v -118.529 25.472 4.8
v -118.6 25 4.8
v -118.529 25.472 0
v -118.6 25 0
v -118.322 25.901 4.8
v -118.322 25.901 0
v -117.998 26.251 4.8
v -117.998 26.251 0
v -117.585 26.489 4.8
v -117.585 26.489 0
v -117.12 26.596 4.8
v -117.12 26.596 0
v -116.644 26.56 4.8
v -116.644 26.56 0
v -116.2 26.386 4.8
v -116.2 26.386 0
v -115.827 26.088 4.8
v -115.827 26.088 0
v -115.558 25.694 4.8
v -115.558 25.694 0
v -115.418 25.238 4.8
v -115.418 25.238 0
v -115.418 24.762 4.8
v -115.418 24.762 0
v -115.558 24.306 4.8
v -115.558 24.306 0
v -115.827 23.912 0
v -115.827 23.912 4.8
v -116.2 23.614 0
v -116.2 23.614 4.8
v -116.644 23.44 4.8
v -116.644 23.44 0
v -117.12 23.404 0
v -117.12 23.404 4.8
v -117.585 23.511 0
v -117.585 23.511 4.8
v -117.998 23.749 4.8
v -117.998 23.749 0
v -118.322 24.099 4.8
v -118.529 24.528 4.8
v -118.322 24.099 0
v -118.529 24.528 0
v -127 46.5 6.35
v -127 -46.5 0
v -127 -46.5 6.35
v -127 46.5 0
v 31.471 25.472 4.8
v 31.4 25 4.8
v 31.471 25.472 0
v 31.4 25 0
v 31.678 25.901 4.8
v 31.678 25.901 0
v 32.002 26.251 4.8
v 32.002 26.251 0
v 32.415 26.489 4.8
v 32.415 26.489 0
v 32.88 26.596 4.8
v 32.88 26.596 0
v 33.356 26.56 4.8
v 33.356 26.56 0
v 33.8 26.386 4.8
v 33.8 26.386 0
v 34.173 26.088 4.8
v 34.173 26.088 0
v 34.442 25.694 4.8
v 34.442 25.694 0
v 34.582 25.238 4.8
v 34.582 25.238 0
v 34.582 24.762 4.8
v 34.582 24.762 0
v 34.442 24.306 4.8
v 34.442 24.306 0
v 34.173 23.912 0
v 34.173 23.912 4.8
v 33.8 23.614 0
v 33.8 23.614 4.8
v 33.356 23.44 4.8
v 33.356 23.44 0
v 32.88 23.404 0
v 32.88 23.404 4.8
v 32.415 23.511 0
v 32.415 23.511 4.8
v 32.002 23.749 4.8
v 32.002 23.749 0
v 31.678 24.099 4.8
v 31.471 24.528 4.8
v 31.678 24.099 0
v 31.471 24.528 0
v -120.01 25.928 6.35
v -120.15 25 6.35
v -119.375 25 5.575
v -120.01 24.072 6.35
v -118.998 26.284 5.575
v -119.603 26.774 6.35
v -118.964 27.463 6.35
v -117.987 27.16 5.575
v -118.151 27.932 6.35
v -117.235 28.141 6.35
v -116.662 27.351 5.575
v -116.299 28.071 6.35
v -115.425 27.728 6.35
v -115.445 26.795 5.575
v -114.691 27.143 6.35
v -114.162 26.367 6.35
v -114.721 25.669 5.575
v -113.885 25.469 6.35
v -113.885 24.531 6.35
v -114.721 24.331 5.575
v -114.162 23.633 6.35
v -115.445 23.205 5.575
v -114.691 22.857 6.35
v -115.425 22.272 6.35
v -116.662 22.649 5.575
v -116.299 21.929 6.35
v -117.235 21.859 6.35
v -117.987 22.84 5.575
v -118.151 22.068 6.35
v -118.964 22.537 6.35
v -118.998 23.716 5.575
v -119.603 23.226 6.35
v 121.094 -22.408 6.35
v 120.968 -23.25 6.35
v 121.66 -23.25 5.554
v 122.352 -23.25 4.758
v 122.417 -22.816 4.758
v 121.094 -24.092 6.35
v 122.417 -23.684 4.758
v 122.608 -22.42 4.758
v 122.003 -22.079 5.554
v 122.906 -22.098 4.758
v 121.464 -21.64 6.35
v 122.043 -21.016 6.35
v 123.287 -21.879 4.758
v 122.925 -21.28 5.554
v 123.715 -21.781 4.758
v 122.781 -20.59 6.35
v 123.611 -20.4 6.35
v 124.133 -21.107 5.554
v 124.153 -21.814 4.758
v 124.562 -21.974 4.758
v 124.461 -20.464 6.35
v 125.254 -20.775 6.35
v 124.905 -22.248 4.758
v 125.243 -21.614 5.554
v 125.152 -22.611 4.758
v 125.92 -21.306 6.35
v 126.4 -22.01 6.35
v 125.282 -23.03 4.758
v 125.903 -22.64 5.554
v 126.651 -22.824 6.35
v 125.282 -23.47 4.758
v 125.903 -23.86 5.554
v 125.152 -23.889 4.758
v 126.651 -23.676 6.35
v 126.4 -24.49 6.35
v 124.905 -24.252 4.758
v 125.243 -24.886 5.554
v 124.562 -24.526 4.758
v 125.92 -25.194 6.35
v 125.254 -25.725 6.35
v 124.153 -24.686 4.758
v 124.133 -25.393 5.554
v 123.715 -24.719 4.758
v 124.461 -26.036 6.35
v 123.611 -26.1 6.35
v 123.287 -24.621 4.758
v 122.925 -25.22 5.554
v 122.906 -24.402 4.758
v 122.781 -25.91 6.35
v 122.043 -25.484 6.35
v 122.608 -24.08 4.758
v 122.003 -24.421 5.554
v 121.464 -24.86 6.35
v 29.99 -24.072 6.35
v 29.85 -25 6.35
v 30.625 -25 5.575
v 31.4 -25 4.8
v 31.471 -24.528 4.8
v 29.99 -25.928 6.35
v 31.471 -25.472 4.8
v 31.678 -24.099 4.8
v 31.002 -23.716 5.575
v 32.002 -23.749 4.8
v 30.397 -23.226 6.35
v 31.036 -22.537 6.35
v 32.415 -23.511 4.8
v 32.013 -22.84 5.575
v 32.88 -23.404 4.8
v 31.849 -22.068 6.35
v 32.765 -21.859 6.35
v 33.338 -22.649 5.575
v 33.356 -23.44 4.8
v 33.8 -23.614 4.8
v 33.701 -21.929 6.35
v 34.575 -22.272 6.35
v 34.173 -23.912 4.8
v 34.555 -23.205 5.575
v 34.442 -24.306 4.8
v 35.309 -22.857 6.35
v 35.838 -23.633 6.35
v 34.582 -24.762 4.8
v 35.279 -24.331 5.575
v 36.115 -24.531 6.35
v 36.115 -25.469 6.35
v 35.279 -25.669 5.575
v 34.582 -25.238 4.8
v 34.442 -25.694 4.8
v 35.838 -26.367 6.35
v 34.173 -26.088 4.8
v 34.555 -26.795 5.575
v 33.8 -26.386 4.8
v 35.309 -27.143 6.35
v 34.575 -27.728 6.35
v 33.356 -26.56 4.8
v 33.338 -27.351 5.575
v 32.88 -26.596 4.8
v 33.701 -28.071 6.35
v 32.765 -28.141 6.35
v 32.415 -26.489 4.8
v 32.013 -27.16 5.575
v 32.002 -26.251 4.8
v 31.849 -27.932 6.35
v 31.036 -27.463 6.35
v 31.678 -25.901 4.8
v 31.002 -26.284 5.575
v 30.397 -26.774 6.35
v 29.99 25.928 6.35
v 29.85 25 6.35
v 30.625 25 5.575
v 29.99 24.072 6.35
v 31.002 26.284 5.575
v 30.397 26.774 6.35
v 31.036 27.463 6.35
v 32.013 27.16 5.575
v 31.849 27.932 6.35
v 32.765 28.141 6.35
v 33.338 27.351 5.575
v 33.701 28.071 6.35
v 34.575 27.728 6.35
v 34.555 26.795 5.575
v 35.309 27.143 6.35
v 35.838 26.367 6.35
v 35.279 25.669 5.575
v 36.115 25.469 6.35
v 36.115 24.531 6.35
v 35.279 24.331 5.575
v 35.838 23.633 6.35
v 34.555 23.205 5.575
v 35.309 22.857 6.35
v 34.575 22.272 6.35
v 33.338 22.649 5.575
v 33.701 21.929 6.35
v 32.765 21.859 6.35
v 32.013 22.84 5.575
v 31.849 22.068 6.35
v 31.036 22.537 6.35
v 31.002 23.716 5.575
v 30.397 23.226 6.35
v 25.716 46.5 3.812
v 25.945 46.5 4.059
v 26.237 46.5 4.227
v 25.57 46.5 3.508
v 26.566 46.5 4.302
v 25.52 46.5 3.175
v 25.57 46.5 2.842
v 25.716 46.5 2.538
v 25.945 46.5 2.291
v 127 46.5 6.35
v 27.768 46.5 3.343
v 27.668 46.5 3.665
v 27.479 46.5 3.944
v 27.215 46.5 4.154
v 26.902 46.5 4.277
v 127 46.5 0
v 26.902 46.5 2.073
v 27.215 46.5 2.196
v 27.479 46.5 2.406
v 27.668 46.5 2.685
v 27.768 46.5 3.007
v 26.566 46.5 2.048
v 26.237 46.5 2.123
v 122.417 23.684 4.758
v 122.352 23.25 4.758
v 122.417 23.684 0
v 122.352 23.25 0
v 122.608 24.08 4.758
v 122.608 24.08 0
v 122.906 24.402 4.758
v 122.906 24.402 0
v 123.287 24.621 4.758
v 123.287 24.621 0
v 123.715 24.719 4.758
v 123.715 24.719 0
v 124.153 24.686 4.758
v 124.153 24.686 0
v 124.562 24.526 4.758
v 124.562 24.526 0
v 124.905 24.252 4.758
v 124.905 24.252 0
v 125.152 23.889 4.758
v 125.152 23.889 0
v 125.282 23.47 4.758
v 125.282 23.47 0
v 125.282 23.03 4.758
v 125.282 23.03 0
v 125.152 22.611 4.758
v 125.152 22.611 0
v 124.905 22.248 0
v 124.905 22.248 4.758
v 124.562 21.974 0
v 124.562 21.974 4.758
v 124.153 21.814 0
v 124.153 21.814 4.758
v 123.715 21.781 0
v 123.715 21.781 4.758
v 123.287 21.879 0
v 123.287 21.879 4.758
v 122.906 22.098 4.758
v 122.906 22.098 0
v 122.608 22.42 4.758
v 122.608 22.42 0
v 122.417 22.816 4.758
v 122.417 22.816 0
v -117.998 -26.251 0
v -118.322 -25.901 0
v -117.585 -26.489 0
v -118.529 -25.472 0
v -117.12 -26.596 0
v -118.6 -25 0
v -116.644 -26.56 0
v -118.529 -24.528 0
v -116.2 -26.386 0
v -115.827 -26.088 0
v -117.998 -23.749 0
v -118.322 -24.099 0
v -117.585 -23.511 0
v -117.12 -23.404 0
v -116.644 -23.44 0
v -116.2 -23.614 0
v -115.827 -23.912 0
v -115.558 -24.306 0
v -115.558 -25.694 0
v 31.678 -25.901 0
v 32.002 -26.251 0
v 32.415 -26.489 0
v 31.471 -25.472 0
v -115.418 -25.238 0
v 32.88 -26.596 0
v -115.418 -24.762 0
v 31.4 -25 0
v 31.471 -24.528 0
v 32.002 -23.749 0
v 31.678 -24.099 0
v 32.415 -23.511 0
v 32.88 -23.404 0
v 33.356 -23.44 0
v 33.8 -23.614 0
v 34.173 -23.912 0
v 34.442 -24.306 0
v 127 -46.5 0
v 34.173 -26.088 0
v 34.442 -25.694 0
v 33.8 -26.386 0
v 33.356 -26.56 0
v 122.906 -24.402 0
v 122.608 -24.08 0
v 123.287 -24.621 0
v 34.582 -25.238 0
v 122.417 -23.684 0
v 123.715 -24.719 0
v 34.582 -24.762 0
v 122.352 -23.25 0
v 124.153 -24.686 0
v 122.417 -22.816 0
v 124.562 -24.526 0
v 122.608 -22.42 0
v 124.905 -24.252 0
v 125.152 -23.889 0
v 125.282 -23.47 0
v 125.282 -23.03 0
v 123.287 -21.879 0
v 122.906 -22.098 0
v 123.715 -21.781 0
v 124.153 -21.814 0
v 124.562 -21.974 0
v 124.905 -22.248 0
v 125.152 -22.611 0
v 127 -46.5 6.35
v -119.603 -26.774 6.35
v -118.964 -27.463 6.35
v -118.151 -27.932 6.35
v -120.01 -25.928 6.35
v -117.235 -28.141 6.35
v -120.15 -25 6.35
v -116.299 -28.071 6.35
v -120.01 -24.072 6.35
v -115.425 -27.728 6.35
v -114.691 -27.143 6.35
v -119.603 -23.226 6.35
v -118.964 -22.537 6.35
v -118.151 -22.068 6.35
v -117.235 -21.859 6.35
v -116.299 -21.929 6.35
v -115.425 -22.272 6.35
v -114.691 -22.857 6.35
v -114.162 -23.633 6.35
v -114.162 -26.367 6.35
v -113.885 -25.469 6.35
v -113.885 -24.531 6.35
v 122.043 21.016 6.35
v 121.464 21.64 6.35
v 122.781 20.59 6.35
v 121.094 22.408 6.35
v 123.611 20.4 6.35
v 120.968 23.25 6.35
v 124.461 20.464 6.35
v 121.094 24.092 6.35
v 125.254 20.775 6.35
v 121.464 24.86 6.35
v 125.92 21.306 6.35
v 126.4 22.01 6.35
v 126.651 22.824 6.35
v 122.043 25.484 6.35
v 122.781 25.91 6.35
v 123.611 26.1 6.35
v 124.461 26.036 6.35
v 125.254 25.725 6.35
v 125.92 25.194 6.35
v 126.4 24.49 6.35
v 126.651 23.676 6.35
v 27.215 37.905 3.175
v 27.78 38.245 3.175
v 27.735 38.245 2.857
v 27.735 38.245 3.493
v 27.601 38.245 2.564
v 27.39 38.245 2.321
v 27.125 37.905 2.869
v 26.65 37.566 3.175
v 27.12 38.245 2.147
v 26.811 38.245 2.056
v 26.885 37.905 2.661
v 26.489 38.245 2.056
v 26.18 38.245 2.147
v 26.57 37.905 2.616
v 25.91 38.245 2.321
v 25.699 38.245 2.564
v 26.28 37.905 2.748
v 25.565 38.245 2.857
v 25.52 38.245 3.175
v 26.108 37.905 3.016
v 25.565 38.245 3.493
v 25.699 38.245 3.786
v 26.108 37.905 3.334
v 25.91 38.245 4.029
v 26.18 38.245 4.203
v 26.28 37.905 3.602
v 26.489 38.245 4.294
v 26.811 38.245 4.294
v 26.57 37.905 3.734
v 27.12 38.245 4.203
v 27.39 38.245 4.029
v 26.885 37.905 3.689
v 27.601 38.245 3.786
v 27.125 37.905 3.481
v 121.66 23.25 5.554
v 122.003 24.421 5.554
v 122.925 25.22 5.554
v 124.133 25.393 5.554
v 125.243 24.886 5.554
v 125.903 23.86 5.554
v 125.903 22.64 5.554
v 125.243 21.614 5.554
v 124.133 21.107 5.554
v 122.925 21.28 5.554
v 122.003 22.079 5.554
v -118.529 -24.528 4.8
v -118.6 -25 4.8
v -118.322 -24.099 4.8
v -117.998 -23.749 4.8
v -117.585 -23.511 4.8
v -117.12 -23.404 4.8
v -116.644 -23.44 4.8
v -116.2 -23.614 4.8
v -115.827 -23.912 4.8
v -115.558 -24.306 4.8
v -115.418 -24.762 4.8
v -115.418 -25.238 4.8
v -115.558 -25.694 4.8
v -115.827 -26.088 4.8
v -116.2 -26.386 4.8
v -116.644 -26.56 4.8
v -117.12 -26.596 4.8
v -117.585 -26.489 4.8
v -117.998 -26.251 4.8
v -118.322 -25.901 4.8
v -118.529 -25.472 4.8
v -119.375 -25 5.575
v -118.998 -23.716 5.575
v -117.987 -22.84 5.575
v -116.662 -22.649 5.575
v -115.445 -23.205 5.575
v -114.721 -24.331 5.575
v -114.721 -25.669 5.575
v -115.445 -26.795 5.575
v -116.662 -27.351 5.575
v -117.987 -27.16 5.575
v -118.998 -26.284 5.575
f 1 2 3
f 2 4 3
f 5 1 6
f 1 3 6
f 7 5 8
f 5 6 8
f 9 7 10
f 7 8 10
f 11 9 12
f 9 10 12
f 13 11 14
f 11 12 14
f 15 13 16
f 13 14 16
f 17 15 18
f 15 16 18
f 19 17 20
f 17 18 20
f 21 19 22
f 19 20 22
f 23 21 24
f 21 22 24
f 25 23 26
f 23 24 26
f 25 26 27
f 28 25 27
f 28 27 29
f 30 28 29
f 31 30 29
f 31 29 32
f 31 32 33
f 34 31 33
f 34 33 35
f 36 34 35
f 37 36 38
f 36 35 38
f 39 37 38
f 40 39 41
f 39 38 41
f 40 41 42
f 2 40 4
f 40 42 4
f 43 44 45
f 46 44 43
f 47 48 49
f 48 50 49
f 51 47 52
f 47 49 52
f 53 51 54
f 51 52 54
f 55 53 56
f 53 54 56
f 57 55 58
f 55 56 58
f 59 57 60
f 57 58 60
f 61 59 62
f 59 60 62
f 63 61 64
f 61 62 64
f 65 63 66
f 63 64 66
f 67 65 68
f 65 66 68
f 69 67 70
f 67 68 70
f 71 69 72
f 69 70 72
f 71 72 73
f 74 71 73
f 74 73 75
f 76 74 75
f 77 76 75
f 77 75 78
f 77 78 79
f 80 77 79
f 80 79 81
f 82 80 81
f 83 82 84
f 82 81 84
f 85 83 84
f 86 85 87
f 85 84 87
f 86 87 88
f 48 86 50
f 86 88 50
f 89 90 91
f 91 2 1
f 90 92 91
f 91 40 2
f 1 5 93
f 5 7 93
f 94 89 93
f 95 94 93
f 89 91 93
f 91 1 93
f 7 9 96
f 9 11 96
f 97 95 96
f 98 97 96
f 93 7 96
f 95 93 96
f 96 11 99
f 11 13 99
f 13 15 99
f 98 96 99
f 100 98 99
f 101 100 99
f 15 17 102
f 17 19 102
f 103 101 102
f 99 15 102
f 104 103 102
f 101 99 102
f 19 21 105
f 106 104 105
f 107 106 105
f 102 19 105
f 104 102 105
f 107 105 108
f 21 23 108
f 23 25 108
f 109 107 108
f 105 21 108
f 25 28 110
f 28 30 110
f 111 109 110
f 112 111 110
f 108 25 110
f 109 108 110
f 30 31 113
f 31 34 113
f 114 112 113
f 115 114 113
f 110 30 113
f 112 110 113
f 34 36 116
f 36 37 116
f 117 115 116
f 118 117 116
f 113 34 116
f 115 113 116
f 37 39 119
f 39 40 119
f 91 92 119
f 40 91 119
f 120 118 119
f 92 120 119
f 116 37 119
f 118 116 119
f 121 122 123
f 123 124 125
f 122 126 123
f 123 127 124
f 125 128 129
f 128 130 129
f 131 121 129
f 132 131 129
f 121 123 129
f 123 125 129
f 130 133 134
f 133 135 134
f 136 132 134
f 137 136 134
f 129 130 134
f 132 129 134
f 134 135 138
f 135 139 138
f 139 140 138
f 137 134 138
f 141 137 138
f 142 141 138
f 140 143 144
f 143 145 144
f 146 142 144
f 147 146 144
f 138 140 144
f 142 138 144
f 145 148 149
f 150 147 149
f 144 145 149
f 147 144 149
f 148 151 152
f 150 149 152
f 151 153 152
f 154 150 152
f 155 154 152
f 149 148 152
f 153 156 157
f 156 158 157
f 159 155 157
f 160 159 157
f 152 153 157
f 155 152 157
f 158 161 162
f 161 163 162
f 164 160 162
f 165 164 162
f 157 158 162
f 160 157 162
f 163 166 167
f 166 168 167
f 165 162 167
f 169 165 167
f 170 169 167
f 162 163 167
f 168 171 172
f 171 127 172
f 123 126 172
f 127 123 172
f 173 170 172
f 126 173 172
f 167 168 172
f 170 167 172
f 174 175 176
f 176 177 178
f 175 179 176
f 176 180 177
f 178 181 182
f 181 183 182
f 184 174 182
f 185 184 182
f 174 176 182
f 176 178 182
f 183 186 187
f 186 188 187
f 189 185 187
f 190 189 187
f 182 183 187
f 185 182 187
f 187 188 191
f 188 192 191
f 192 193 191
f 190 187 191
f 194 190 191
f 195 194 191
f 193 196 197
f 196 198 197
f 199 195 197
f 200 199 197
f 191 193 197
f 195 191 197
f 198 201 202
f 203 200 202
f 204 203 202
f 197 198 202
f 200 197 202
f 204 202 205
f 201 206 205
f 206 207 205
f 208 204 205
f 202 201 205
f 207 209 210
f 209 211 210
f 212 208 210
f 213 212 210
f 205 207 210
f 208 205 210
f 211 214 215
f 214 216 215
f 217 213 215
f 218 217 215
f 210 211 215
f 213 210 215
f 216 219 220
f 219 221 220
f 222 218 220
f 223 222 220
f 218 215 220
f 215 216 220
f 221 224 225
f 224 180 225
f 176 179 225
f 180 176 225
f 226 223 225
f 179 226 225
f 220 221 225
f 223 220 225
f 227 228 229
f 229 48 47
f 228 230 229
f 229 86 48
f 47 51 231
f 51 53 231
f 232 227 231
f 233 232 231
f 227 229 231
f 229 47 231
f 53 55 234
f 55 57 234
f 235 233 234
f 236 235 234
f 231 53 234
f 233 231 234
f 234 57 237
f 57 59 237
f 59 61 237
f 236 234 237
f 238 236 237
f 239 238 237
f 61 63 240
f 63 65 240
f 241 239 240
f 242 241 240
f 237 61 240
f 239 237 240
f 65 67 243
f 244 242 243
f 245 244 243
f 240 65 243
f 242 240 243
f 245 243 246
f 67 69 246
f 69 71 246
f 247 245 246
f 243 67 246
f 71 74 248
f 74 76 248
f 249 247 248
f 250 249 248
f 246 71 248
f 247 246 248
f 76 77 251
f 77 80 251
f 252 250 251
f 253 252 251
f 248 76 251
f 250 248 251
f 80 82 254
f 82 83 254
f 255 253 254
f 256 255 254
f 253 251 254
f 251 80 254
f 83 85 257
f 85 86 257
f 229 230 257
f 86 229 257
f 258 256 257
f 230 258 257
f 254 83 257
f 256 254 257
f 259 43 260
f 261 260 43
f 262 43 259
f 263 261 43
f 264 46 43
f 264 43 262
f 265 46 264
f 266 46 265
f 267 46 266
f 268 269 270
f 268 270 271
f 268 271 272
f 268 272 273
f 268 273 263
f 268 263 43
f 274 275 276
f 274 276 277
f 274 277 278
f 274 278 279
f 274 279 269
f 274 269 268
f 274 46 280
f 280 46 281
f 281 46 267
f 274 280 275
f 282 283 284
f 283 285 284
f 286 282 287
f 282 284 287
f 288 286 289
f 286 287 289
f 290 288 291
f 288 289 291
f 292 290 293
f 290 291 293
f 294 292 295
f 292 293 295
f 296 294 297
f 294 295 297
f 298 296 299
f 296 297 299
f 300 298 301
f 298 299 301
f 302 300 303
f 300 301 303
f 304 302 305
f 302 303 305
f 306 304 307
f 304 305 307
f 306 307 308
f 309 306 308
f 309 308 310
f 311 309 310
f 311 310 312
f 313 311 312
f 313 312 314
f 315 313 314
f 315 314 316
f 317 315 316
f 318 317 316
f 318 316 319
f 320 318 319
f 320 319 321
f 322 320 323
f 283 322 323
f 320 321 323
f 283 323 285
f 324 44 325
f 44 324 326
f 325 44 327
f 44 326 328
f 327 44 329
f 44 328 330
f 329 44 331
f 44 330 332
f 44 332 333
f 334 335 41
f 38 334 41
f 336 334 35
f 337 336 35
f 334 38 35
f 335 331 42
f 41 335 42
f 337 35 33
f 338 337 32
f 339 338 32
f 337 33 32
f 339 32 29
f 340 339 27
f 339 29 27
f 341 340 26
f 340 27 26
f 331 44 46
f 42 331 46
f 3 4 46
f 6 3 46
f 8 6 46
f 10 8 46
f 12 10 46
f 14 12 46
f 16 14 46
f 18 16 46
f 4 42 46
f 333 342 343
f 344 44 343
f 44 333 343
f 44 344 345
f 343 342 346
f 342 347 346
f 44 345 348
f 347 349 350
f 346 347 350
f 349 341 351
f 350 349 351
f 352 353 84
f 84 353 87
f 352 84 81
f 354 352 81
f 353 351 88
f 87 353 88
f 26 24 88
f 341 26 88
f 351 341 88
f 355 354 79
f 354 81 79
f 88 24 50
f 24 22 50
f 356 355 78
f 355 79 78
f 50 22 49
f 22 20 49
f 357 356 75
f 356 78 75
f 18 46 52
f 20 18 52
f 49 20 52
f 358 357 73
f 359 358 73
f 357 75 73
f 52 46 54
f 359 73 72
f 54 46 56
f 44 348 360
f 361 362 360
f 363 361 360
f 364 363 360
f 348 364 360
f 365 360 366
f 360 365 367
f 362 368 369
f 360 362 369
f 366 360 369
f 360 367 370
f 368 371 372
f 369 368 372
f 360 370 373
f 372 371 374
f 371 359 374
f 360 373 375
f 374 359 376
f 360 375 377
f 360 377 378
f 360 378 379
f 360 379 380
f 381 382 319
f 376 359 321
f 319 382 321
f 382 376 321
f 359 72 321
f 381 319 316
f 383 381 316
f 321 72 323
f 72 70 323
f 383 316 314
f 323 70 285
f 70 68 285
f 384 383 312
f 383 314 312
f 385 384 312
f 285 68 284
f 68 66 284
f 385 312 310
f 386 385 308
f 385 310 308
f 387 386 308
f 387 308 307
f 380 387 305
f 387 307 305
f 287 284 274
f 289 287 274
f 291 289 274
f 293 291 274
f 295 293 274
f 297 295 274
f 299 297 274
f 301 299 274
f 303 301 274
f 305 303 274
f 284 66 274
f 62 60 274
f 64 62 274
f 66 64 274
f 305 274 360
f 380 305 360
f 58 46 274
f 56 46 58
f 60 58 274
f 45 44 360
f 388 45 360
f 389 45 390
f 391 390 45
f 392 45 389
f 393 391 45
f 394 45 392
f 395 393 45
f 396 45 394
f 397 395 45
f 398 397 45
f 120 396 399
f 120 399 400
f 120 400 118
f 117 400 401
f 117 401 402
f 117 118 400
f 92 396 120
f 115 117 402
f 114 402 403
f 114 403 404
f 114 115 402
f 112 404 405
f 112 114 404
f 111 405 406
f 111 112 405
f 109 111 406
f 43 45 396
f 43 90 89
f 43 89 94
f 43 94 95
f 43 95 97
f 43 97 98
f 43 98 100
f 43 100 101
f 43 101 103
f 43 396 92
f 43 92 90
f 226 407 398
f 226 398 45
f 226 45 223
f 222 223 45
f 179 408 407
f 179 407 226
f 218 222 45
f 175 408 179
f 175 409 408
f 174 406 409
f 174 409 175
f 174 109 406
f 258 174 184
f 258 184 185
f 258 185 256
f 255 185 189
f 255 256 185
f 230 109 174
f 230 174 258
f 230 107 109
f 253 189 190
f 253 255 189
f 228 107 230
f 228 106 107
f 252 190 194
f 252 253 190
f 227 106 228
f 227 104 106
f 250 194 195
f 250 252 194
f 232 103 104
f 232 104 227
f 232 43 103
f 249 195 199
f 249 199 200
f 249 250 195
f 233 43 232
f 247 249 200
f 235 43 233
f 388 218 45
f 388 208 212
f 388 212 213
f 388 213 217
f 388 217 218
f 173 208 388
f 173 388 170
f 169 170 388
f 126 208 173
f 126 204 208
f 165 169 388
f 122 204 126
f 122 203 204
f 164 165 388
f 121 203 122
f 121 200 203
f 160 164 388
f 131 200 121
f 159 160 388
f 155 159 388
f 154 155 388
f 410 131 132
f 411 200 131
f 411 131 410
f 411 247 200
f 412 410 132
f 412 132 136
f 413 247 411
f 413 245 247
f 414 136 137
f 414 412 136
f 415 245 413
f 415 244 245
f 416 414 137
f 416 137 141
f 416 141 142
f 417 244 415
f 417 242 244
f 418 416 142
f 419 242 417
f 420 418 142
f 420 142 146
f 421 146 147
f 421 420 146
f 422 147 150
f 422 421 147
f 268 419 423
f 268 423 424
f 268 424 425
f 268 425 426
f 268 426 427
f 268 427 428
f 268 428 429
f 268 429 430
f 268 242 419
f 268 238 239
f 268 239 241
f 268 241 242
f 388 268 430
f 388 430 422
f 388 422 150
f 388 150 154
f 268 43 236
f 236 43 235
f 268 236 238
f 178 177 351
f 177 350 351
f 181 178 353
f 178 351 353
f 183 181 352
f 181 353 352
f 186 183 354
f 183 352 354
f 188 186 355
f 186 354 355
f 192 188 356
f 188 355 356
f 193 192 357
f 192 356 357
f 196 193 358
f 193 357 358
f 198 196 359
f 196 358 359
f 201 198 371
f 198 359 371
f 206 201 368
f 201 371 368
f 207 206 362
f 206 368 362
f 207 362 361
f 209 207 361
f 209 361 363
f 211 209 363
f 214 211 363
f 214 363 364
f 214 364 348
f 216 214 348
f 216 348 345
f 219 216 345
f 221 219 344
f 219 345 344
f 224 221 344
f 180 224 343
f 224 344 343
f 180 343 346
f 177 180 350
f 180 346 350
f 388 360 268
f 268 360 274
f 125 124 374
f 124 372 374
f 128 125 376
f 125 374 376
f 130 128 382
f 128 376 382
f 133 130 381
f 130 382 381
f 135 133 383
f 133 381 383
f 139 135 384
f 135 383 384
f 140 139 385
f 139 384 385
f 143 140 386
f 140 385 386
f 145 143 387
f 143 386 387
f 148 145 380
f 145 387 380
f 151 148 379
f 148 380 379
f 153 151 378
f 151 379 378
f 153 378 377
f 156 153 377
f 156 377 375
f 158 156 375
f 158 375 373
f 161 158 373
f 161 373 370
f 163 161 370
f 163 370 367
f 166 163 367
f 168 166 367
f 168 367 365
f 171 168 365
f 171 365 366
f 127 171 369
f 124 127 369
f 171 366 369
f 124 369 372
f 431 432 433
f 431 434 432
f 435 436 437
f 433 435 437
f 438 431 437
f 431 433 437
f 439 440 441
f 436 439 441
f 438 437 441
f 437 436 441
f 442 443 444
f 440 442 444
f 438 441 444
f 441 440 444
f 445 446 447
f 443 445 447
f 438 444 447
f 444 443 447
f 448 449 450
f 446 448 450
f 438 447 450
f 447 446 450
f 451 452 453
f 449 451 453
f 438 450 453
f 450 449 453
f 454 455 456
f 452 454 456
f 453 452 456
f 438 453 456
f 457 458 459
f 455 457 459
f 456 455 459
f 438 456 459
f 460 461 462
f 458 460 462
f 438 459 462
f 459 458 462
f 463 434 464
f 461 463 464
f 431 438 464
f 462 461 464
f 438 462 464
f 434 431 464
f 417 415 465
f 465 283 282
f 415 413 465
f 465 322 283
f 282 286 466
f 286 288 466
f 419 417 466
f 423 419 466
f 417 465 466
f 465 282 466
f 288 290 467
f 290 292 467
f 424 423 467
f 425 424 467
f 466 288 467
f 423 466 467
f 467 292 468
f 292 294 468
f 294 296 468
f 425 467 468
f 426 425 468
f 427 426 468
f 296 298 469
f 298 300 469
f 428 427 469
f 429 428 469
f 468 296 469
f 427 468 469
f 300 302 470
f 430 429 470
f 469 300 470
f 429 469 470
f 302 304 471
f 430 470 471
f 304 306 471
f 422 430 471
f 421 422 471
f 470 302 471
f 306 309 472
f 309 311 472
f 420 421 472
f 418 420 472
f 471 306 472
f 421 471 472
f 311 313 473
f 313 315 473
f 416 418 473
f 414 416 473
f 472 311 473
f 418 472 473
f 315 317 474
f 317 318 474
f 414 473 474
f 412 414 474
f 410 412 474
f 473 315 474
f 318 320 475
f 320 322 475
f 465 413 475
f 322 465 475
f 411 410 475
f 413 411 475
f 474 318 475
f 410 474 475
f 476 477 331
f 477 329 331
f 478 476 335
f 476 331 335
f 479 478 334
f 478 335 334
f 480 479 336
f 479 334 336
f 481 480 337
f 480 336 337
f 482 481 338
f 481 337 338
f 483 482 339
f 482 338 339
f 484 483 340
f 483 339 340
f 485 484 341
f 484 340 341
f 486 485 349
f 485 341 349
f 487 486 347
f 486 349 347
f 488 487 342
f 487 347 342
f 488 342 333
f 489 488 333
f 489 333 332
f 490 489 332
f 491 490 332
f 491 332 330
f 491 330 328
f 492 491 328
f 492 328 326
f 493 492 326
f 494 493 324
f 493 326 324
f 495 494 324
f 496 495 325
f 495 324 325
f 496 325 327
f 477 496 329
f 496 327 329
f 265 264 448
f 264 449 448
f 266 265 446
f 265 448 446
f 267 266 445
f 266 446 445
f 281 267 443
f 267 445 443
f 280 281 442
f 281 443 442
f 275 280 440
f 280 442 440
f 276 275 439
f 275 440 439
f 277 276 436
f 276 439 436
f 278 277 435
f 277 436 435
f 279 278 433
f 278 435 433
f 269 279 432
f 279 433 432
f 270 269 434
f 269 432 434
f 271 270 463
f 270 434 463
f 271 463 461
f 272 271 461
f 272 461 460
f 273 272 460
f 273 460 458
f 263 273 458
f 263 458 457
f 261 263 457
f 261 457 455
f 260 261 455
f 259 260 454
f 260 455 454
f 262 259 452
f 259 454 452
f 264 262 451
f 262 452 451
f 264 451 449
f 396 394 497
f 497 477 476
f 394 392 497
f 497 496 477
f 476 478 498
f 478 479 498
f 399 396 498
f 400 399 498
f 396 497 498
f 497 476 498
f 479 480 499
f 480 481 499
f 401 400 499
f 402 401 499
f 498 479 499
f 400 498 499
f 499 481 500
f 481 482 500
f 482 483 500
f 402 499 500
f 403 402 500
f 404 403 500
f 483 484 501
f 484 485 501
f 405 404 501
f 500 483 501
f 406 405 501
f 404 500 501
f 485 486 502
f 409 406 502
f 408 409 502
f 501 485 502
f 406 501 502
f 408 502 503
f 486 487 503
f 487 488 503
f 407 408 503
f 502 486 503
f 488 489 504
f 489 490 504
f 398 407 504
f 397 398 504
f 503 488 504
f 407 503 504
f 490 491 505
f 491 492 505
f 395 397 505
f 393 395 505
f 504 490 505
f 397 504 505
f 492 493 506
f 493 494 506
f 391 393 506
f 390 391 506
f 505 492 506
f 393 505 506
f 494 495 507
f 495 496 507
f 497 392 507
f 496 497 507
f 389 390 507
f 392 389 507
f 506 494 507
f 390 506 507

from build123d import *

# Parameters (mm, degrees)
SKETCH1_W                                       = 254
SKETCH1_H                                       = 93
BOSS_EXTRUDE1_DEPTH                             = 6.35
CSK_FOR_4_FLAT_HEAD_MACHINE_SCREW1_D            = 2.9464
CSK_FOR_4_FLAT_HEAD_MACHINE_SCREW1_CSINK_D      = 5.715
CSK_FOR_4_FLAT_HEAD_MACHINE_SCREW1_CSINK_ANGLE  = 82
CSK_FOR_M3_FLAT_HEAD_MACHINE_SCREW1_D           = 3.2
CSK_FOR_M3_FLAT_HEAD_MACHINE_SCREW1_CSINK_D     = 6.3
CSK_FOR_M3_FLAT_HEAD_MACHINE_SCREW1_CSINK_ANGLE = 90
F_4_40_TAPPED_HOLE1_D                           = 2.2606
F_4_40_TAPPED_HOLE1_DEPTH                       = 8.255
F_4_40_TAPPED_HOLE1_TIP                         = 0.679152758


with BuildPart() as part:
    # Sketch1 → Boss-Extrude1 (new body)
    with BuildSketch(Plane.XY):
        Rectangle(SKETCH1_W, SKETCH1_H)
    extrude(amount=BOSS_EXTRUDE1_DEPTH)

    # CSK for #4 Flat Head Machine Screw1 (through all)
    with Locations(Plane.XY.offset(6.35)):
        with Locations((123.825, 23.249999946), (123.825, -23.250000018)):
            CounterSinkHole(CSK_FOR_4_FLAT_HEAD_MACHINE_SCREW1_D / 2, CSK_FOR_4_FLAT_HEAD_MACHINE_SCREW1_CSINK_D / 2, counter_sink_angle=CSK_FOR_4_FLAT_HEAD_MACHINE_SCREW1_CSINK_ANGLE)

    # CSK for M3 Flat Head Machine Screw1 (through all)
    with Locations(Plane.XY.offset(6.35)):
        with Locations((-117, 25), (-117, -25), (33, -25), (33, 25)):
            CounterSinkHole(CSK_FOR_M3_FLAT_HEAD_MACHINE_SCREW1_D / 2, CSK_FOR_M3_FLAT_HEAD_MACHINE_SCREW1_CSINK_D / 2, counter_sink_angle=CSK_FOR_M3_FLAT_HEAD_MACHINE_SCREW1_CSINK_ANGLE)

    # #4-40 Tapped Hole1
    with Locations(Plane(origin=(0, 46.5, 0), x_dir=(1, 0, 0), z_dir=(0, 1, 0))):
        with Locations((26.65, -3.175)):
            Hole(F_4_40_TAPPED_HOLE1_D / 2, depth=F_4_40_TAPPED_HOLE1_DEPTH)
            with Locations((0, 0, -(F_4_40_TAPPED_HOLE1_DEPTH + F_4_40_TAPPED_HOLE1_TIP / 2))):  # 118° drill point
                Cone(0, F_4_40_TAPPED_HOLE1_D / 2, F_4_40_TAPPED_HOLE1_TIP, mode=Mode.SUBTRACT)


solid = part.part
